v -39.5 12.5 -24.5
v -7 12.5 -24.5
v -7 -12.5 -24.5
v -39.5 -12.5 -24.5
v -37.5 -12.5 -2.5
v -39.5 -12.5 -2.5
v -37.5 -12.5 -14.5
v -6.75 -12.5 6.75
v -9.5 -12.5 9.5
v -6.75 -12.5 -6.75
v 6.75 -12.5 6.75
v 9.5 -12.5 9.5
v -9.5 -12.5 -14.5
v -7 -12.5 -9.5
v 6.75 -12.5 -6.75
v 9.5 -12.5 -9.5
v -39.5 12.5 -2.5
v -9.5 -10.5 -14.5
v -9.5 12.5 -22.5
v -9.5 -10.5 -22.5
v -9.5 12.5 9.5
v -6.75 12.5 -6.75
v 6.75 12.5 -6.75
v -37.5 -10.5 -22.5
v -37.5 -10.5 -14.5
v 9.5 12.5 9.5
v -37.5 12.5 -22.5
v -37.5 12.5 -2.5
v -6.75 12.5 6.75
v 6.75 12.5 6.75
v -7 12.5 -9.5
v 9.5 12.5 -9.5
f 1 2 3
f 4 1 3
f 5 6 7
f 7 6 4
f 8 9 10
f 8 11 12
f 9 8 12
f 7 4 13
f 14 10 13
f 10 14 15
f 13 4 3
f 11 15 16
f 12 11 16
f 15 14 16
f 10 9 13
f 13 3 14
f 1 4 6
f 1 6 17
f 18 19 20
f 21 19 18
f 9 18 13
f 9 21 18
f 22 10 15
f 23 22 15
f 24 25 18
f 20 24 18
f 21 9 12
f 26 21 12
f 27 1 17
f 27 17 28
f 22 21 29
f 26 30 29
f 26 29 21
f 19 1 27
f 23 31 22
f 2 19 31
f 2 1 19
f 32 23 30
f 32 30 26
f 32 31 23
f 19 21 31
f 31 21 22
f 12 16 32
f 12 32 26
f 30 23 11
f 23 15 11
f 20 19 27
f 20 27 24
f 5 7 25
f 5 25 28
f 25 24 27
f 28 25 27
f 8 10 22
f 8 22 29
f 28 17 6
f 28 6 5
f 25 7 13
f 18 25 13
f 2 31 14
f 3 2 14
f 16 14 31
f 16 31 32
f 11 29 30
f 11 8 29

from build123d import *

# Parameters (mm, degrees)
F0_W     = 19
F0_H     = 19
F0_W_2   = 13.5
F0_H_2   = 13.5
F1_DEPTH = 12.5
F2_W     = 25
F2_H     = 34
F3_DEPTH = 2.5
F4_W     = 25
F4_H     = 2
F5_DEPTH = 30
F6_W     = 2
F6_H     = 25
F7_DEPTH = 20
F8_W     = 32.5
F8_H     = 10
F9_DEPTH = 2


with BuildPart() as f1:
    # F0 (on Front) → F1 (new body, symmetric)
    with BuildSketch(Plane.XZ):
        Rectangle(F0_W, F0_H)
        Rectangle(F0_W_2, F0_H_2, mode=Mode.SUBTRACT)
    extrude(amount=F1_DEPTH, both=True)

    # F2 (on face) → F3 (join)
    with BuildSketch(Plane(origin=(-9.5, 0, 0), x_dir=(0, -1, 0), z_dir=(-1, 0, 0))):
        with Locations((0, -7.5)):
            Rectangle(F2_W, F2_H)
    extrude(amount=-F3_DEPTH)

    # F4 (on face) → F5 (join)
    with BuildSketch(Plane(origin=(-9.5, 0, 0), x_dir=(0, -1, 0), z_dir=(-1, 0, 0))):
        with Locations((0, -23.5)):
            Rectangle(F4_W, F4_H)
    extrude(amount=F5_DEPTH)

    # F6 (on face) → F7 (join)
    with BuildSketch(Plane.XY.offset(-22.5)):
        with Locations((-38.5, 0)):
            Rectangle(F6_W, F6_H)
    extrude(amount=F7_DEPTH)

    # F8 (on face) → F9 (join)
    with BuildSketch(Plane.XZ.offset(12.5)):
        with Locations((-23.25, -19.5)):
            Rectangle(F8_W, F8_H)
    extrude(amount=-F9_DEPTH)


solid = f1.part
